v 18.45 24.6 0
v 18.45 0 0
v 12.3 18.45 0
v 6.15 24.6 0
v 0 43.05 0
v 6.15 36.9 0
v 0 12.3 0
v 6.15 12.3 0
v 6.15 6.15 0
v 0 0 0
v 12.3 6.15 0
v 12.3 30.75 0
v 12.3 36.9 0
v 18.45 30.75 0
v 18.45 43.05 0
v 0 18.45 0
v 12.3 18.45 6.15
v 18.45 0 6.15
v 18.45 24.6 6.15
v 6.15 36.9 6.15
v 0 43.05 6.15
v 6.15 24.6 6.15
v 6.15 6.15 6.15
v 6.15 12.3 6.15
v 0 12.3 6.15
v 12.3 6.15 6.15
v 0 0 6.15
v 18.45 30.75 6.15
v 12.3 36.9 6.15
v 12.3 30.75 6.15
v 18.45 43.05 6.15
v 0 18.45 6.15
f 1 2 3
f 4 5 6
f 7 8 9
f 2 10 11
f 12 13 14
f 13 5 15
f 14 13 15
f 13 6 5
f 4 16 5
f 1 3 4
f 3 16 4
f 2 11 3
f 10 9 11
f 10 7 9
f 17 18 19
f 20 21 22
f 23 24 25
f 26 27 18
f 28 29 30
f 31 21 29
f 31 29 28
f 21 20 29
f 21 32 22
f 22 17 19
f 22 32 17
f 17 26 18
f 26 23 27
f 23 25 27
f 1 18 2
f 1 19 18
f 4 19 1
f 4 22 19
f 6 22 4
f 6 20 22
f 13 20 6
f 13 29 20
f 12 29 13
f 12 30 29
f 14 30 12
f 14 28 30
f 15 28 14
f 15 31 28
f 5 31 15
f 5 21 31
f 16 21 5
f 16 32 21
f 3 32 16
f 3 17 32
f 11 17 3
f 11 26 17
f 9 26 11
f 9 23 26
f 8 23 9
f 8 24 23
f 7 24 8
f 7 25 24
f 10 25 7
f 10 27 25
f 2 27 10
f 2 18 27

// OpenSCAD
width=6.15; // mm

linear_extrude(width) {
    difference() {
        square([width * 3, width * 7]);
        translate([0, width * 2]) {
            square([width * 2, width]);
        }
        translate([width, width]) {
            square([width, width * 2]);
        }
        translate([width, width * 4]) {
            square([width * 2, width]);
        }
        translate([width, width * 4]) {
            square([width, width * 2]);
        }
    }
}
